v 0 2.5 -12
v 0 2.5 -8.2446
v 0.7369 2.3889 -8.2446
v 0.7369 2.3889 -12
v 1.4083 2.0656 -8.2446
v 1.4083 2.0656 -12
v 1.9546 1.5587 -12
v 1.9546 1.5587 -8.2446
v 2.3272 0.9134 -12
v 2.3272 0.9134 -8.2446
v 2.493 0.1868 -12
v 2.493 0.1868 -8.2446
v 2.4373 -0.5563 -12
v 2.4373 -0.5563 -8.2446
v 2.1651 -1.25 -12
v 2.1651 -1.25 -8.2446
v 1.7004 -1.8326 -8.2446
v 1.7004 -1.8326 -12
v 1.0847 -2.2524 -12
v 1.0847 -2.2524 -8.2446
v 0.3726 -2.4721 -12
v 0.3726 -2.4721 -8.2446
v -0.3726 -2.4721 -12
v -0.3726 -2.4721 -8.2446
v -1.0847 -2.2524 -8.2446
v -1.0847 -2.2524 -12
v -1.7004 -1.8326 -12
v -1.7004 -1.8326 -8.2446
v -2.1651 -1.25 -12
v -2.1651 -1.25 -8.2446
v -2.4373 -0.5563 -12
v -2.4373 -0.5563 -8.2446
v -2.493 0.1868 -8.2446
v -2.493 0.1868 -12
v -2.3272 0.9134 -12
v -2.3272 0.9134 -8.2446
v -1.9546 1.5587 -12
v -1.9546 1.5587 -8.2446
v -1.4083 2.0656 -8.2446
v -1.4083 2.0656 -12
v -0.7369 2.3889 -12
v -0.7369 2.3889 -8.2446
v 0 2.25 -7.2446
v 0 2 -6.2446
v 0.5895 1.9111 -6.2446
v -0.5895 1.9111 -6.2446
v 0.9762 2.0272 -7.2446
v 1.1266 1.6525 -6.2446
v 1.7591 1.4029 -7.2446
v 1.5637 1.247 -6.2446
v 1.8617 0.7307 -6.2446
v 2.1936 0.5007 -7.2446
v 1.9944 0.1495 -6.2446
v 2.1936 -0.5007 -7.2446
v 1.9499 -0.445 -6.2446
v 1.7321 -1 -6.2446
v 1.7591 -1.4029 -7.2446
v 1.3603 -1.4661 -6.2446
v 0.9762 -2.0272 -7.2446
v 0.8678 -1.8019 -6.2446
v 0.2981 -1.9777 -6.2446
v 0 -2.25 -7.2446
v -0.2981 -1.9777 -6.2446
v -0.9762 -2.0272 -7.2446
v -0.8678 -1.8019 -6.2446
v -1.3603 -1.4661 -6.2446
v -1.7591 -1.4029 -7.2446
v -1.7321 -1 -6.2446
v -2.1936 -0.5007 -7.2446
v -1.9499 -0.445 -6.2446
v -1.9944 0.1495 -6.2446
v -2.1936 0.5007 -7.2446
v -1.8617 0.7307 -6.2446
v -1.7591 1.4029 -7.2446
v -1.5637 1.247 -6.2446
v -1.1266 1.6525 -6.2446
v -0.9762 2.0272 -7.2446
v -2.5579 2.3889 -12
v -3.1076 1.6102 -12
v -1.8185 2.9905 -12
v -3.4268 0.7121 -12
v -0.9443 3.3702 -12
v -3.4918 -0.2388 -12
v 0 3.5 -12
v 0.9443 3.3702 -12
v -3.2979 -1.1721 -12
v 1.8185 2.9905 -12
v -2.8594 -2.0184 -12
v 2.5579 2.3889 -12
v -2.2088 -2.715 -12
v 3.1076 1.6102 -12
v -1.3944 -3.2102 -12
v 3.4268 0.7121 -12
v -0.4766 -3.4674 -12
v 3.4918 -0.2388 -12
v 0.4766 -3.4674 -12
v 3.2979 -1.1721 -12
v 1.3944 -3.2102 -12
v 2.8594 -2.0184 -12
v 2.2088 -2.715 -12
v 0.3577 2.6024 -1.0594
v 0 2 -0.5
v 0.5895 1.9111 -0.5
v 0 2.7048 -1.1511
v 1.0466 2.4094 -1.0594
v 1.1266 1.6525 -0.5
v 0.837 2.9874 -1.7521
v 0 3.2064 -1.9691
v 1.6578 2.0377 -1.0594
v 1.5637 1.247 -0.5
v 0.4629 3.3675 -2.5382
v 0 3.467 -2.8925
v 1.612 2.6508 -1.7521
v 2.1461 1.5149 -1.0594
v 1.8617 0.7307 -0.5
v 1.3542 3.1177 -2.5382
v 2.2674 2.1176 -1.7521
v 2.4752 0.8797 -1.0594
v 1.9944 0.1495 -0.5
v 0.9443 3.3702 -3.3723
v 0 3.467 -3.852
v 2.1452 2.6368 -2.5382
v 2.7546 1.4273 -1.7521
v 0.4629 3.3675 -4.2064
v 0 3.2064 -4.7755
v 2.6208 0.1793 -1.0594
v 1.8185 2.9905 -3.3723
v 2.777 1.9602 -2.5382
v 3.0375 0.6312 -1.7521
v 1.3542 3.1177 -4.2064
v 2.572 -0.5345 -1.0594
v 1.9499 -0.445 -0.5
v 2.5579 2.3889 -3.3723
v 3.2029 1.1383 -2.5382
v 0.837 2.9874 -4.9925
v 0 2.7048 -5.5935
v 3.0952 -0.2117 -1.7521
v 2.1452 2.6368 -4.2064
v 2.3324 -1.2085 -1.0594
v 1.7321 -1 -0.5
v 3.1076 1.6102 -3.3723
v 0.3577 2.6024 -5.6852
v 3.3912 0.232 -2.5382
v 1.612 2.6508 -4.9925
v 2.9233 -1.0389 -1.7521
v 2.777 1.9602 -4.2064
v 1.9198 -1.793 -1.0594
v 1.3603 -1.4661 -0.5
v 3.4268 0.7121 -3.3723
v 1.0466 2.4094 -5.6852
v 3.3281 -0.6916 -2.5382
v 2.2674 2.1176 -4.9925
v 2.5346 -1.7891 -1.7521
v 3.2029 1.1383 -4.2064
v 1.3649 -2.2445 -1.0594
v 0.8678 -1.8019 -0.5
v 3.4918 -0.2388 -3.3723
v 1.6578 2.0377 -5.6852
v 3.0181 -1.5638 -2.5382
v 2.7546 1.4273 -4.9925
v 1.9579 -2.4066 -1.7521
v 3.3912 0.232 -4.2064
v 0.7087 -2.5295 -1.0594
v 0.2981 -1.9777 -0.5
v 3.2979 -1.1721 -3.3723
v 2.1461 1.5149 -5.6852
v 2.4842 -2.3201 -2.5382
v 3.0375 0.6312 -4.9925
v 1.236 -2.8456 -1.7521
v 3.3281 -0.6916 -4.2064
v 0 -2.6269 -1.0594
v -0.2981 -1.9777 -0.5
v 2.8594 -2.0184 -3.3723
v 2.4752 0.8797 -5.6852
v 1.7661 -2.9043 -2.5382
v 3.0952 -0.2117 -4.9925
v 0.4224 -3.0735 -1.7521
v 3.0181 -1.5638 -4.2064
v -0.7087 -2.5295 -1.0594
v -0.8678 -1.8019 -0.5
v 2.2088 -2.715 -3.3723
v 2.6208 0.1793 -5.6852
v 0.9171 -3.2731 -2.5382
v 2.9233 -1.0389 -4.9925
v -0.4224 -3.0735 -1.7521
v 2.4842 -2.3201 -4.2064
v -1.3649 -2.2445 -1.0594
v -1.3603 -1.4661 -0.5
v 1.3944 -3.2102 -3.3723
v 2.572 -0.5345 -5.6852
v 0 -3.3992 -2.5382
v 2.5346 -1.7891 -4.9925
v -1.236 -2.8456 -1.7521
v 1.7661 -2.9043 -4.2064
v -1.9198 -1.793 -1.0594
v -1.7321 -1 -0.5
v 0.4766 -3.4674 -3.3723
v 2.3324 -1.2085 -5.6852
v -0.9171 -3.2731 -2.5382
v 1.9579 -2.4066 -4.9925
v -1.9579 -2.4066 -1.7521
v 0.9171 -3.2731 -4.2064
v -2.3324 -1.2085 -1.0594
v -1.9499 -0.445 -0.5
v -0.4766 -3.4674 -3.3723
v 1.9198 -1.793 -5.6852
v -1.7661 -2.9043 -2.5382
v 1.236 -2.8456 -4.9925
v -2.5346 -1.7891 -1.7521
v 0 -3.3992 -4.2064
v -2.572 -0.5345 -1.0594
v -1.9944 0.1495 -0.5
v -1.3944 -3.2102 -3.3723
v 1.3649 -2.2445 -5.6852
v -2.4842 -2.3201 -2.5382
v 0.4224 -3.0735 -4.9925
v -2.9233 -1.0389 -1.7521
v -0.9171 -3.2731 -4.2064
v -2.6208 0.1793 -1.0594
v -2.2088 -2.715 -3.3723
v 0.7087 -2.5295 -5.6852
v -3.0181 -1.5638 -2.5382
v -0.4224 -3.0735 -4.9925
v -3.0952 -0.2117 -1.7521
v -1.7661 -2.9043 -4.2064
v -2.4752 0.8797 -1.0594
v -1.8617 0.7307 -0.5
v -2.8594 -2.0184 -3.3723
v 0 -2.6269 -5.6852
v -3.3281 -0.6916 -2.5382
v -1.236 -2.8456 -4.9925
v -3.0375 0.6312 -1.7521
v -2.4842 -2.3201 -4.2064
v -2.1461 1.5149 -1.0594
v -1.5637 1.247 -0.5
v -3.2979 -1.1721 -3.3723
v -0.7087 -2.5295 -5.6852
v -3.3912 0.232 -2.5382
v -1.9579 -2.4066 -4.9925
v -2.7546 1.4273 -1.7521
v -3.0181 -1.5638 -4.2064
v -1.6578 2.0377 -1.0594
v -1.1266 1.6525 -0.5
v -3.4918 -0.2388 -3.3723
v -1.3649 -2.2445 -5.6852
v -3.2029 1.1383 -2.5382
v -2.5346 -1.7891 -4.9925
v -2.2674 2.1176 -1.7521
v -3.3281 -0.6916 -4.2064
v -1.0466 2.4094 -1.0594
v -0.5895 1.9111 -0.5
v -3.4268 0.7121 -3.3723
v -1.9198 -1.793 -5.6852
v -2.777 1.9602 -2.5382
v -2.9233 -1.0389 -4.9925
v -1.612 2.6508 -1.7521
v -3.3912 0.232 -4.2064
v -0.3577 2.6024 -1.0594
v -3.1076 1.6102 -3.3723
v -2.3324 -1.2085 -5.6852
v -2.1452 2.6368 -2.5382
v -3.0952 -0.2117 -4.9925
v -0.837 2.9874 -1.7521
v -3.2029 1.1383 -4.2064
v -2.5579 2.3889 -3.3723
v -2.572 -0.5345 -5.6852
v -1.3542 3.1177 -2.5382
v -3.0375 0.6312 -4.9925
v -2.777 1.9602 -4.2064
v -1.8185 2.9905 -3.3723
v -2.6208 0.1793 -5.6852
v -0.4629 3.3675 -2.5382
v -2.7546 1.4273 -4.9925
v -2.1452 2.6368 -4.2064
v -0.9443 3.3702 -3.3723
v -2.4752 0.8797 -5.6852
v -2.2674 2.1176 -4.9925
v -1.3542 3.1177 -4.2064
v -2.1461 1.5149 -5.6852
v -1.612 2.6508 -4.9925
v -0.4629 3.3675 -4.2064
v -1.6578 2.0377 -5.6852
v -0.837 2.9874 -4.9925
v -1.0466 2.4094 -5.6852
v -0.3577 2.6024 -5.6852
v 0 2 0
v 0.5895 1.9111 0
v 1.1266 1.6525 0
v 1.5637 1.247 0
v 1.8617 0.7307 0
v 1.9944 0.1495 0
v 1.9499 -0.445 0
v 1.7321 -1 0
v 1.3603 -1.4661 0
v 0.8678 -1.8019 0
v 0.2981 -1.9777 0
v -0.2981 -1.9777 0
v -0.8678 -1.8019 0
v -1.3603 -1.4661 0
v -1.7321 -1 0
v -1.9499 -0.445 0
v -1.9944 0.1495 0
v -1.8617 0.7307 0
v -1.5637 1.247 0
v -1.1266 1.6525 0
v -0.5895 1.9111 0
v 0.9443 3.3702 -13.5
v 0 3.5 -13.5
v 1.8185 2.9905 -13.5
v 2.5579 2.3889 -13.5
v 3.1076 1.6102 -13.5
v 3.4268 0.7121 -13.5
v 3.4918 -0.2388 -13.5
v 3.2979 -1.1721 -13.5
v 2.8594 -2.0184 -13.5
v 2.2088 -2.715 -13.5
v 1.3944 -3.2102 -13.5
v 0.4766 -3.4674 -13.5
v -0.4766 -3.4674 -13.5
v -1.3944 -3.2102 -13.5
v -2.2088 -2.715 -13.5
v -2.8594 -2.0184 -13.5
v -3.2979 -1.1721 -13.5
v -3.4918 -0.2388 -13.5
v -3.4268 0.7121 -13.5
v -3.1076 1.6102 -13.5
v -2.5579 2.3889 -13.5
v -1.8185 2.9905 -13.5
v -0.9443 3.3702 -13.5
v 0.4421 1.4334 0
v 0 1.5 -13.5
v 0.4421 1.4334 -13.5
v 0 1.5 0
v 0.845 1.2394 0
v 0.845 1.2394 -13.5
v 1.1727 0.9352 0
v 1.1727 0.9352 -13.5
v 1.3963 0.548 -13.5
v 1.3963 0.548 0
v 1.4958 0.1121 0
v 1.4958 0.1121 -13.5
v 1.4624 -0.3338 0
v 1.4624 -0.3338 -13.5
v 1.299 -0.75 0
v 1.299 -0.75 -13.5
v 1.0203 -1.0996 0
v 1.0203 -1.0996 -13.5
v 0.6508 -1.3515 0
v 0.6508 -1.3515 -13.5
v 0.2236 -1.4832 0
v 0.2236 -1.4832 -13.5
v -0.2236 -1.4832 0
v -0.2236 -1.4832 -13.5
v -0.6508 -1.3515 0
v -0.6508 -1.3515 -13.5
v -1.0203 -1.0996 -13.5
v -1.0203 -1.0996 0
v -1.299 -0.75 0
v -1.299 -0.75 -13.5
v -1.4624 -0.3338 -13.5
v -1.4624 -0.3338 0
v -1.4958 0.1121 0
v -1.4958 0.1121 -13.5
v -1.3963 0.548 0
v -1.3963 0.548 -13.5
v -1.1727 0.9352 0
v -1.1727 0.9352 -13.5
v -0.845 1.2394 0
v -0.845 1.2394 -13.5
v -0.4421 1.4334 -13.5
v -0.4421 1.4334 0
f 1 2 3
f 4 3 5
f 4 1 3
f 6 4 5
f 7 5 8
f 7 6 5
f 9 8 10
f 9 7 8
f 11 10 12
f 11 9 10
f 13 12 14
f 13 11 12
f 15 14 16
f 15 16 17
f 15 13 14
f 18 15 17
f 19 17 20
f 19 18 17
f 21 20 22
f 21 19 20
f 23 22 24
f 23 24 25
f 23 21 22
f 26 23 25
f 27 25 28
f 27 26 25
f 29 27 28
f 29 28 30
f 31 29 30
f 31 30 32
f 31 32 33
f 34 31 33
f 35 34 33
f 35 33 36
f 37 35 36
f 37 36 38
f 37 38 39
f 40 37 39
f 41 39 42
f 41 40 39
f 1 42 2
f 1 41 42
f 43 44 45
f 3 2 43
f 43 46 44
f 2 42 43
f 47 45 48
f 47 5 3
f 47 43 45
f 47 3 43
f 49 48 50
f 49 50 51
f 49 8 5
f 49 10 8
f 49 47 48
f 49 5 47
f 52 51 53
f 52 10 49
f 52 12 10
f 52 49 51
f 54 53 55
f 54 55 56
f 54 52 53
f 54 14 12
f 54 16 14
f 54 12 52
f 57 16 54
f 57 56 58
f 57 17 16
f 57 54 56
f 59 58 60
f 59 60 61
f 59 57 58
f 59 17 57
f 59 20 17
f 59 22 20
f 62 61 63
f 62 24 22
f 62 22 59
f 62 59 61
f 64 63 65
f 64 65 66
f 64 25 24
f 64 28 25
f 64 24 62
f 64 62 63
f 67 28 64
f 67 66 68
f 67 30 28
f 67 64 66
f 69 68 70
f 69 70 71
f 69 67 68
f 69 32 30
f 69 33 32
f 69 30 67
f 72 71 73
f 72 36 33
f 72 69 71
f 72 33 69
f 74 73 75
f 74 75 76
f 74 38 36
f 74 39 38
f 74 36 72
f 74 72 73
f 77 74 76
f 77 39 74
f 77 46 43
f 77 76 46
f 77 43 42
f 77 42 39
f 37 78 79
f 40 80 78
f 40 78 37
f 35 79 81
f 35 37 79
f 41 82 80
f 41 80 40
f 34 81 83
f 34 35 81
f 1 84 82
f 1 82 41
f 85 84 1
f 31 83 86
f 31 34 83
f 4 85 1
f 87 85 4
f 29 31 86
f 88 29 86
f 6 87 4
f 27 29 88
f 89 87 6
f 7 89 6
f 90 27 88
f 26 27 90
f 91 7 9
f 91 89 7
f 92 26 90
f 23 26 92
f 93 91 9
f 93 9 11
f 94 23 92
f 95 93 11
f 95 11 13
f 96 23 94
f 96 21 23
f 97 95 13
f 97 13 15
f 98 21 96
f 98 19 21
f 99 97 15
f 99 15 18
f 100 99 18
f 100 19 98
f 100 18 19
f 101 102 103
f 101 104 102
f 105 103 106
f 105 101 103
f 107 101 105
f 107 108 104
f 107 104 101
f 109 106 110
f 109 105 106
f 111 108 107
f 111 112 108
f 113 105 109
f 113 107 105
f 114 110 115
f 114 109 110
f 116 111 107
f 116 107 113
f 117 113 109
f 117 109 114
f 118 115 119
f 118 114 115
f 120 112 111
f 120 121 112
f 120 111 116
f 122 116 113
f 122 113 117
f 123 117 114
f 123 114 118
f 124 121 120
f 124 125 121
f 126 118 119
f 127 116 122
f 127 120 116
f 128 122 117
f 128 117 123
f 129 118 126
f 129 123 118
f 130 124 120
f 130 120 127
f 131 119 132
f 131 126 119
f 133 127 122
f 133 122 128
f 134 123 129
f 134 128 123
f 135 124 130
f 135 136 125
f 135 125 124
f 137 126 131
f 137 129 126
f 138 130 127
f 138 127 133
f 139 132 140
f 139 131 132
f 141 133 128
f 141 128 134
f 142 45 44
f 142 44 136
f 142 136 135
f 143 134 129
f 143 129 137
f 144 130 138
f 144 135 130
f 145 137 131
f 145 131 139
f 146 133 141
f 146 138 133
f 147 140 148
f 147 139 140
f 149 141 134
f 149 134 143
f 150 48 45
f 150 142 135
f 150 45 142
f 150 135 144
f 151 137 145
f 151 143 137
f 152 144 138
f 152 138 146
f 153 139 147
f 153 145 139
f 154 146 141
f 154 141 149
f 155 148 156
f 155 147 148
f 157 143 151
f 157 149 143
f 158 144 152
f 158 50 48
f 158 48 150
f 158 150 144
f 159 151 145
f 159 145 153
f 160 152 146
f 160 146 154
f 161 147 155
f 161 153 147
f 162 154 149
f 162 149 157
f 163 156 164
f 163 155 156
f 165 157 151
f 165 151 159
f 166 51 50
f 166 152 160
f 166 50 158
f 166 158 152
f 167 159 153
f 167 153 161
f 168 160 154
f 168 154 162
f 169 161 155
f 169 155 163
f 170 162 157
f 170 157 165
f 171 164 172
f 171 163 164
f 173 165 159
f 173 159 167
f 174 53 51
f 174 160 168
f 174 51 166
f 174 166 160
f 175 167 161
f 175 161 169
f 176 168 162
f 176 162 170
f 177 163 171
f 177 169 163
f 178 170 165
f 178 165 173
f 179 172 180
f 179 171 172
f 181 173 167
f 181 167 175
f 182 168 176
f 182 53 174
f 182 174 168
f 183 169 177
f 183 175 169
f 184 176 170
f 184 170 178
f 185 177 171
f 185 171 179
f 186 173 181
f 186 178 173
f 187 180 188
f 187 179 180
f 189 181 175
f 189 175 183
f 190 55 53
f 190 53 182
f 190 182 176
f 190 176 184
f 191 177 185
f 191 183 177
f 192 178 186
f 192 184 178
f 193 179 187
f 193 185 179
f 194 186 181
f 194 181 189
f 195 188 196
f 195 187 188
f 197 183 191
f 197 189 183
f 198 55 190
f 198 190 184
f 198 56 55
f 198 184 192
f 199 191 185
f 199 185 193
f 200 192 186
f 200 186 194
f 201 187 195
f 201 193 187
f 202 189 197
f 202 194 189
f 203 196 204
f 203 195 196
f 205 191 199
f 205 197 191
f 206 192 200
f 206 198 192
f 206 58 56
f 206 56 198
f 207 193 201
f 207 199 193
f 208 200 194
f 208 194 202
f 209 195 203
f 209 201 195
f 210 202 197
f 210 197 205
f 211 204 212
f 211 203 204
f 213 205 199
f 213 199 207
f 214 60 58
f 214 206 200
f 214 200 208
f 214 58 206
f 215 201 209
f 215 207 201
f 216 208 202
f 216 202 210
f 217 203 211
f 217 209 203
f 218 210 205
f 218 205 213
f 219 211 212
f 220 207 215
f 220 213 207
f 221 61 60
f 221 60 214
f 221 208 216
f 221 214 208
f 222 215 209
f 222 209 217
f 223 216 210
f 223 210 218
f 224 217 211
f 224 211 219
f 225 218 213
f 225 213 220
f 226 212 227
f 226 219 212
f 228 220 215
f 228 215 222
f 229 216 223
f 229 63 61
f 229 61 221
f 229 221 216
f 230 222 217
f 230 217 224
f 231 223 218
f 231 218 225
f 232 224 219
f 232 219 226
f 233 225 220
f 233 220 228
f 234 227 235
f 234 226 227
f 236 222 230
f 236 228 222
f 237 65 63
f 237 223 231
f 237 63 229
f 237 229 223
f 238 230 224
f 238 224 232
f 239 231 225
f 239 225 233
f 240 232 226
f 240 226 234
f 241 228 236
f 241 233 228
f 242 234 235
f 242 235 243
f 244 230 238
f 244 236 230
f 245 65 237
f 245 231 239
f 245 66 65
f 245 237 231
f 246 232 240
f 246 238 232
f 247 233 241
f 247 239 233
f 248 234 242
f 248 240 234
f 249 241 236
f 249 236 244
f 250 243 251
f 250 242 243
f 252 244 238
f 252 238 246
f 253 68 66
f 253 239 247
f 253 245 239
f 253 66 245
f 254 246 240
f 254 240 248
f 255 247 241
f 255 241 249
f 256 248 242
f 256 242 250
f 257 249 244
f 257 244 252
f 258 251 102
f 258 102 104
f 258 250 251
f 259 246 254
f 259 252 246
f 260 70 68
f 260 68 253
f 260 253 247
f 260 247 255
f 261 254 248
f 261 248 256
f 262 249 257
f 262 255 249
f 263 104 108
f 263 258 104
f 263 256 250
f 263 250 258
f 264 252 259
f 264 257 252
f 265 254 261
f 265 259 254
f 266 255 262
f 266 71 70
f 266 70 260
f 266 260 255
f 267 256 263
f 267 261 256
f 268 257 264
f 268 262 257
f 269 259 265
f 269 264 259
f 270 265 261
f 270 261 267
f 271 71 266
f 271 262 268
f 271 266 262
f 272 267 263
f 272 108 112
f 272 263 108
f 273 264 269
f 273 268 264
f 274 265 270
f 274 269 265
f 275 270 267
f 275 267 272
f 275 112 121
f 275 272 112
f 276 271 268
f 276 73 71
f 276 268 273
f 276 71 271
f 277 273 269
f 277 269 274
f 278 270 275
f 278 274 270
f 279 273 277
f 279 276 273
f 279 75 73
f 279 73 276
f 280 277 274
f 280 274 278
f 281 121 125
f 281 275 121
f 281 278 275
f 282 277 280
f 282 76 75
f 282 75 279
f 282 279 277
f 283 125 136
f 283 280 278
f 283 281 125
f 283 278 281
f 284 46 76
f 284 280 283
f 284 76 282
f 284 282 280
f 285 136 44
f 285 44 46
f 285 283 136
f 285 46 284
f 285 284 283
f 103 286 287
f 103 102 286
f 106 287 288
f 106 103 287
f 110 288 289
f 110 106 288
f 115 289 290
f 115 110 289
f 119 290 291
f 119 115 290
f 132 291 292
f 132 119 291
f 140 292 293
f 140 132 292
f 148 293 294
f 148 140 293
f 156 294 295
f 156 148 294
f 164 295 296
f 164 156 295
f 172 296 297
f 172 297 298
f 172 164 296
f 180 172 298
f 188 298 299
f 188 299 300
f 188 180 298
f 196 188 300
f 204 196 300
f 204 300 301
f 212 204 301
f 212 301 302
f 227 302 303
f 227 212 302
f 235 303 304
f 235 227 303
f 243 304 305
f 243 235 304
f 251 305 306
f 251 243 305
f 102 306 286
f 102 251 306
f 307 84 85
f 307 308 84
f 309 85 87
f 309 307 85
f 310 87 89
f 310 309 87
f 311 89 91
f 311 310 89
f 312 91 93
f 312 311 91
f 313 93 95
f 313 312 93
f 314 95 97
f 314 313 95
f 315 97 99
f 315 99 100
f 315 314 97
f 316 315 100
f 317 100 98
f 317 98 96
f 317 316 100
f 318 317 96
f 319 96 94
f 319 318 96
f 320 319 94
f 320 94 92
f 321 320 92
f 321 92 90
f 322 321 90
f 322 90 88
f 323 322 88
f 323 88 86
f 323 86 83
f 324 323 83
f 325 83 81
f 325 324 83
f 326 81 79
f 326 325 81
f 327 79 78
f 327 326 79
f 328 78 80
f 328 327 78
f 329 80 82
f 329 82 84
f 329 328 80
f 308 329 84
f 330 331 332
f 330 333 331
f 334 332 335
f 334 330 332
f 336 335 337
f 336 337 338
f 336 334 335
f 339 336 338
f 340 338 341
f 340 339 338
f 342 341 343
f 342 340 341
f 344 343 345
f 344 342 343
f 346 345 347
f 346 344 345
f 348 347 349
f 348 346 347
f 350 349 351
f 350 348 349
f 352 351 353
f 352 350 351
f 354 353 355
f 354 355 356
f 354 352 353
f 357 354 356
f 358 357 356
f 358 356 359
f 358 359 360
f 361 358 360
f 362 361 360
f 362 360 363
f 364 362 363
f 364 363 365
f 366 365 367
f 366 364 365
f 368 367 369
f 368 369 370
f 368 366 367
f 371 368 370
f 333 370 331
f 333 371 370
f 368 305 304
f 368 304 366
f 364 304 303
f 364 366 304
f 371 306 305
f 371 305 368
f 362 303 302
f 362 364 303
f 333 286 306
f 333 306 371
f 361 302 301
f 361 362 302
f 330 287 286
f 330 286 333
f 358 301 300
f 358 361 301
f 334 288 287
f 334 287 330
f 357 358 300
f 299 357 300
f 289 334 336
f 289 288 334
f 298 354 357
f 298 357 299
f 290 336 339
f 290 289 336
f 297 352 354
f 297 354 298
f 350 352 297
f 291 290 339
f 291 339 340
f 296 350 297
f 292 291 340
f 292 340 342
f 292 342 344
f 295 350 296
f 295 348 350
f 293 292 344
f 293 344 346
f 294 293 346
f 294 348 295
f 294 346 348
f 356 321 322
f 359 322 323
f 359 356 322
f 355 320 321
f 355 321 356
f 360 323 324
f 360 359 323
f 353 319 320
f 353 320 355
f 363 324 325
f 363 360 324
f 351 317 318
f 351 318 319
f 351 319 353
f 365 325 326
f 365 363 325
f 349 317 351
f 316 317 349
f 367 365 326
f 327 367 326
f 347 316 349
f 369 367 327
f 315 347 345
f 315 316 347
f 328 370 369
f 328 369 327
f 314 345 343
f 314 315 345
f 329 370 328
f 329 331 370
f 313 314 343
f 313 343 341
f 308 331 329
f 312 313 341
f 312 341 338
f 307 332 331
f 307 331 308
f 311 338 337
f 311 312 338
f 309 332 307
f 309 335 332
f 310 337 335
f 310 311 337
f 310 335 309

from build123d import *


with BuildPart() as part:
    # Sketch1 → Revolve1 (revolve)
    with BuildSketch(Plane(origin=(0, 0, 0), x_dir=(0, 0, -1), z_dir=(1, 0, 0))):
        with BuildLine():
            Line((6.244562647, 2), (8.244562647, 2.5))
            Line((8.244562647, 2.5), (12, 2.5))
            Line((12, 2.5), (12, 3.5))
            Line((12, 3.5), (13.5, 3.5))
            Line((13.5, 3.5), (13.5, 1.5))
            Line((13.5, 1.5), (0, 1.5))
            Line((0, 1.5), (0, 2))
            Line((0, 2), (0.5, 2))
            ThreePointArc((0.5, 2), (3.372281323, 3.5), (6.244562647, 2))
        make_face()
    revolve(axis=Axis((0, 0, 0), (0, 0, -1)))


solid = part.part
